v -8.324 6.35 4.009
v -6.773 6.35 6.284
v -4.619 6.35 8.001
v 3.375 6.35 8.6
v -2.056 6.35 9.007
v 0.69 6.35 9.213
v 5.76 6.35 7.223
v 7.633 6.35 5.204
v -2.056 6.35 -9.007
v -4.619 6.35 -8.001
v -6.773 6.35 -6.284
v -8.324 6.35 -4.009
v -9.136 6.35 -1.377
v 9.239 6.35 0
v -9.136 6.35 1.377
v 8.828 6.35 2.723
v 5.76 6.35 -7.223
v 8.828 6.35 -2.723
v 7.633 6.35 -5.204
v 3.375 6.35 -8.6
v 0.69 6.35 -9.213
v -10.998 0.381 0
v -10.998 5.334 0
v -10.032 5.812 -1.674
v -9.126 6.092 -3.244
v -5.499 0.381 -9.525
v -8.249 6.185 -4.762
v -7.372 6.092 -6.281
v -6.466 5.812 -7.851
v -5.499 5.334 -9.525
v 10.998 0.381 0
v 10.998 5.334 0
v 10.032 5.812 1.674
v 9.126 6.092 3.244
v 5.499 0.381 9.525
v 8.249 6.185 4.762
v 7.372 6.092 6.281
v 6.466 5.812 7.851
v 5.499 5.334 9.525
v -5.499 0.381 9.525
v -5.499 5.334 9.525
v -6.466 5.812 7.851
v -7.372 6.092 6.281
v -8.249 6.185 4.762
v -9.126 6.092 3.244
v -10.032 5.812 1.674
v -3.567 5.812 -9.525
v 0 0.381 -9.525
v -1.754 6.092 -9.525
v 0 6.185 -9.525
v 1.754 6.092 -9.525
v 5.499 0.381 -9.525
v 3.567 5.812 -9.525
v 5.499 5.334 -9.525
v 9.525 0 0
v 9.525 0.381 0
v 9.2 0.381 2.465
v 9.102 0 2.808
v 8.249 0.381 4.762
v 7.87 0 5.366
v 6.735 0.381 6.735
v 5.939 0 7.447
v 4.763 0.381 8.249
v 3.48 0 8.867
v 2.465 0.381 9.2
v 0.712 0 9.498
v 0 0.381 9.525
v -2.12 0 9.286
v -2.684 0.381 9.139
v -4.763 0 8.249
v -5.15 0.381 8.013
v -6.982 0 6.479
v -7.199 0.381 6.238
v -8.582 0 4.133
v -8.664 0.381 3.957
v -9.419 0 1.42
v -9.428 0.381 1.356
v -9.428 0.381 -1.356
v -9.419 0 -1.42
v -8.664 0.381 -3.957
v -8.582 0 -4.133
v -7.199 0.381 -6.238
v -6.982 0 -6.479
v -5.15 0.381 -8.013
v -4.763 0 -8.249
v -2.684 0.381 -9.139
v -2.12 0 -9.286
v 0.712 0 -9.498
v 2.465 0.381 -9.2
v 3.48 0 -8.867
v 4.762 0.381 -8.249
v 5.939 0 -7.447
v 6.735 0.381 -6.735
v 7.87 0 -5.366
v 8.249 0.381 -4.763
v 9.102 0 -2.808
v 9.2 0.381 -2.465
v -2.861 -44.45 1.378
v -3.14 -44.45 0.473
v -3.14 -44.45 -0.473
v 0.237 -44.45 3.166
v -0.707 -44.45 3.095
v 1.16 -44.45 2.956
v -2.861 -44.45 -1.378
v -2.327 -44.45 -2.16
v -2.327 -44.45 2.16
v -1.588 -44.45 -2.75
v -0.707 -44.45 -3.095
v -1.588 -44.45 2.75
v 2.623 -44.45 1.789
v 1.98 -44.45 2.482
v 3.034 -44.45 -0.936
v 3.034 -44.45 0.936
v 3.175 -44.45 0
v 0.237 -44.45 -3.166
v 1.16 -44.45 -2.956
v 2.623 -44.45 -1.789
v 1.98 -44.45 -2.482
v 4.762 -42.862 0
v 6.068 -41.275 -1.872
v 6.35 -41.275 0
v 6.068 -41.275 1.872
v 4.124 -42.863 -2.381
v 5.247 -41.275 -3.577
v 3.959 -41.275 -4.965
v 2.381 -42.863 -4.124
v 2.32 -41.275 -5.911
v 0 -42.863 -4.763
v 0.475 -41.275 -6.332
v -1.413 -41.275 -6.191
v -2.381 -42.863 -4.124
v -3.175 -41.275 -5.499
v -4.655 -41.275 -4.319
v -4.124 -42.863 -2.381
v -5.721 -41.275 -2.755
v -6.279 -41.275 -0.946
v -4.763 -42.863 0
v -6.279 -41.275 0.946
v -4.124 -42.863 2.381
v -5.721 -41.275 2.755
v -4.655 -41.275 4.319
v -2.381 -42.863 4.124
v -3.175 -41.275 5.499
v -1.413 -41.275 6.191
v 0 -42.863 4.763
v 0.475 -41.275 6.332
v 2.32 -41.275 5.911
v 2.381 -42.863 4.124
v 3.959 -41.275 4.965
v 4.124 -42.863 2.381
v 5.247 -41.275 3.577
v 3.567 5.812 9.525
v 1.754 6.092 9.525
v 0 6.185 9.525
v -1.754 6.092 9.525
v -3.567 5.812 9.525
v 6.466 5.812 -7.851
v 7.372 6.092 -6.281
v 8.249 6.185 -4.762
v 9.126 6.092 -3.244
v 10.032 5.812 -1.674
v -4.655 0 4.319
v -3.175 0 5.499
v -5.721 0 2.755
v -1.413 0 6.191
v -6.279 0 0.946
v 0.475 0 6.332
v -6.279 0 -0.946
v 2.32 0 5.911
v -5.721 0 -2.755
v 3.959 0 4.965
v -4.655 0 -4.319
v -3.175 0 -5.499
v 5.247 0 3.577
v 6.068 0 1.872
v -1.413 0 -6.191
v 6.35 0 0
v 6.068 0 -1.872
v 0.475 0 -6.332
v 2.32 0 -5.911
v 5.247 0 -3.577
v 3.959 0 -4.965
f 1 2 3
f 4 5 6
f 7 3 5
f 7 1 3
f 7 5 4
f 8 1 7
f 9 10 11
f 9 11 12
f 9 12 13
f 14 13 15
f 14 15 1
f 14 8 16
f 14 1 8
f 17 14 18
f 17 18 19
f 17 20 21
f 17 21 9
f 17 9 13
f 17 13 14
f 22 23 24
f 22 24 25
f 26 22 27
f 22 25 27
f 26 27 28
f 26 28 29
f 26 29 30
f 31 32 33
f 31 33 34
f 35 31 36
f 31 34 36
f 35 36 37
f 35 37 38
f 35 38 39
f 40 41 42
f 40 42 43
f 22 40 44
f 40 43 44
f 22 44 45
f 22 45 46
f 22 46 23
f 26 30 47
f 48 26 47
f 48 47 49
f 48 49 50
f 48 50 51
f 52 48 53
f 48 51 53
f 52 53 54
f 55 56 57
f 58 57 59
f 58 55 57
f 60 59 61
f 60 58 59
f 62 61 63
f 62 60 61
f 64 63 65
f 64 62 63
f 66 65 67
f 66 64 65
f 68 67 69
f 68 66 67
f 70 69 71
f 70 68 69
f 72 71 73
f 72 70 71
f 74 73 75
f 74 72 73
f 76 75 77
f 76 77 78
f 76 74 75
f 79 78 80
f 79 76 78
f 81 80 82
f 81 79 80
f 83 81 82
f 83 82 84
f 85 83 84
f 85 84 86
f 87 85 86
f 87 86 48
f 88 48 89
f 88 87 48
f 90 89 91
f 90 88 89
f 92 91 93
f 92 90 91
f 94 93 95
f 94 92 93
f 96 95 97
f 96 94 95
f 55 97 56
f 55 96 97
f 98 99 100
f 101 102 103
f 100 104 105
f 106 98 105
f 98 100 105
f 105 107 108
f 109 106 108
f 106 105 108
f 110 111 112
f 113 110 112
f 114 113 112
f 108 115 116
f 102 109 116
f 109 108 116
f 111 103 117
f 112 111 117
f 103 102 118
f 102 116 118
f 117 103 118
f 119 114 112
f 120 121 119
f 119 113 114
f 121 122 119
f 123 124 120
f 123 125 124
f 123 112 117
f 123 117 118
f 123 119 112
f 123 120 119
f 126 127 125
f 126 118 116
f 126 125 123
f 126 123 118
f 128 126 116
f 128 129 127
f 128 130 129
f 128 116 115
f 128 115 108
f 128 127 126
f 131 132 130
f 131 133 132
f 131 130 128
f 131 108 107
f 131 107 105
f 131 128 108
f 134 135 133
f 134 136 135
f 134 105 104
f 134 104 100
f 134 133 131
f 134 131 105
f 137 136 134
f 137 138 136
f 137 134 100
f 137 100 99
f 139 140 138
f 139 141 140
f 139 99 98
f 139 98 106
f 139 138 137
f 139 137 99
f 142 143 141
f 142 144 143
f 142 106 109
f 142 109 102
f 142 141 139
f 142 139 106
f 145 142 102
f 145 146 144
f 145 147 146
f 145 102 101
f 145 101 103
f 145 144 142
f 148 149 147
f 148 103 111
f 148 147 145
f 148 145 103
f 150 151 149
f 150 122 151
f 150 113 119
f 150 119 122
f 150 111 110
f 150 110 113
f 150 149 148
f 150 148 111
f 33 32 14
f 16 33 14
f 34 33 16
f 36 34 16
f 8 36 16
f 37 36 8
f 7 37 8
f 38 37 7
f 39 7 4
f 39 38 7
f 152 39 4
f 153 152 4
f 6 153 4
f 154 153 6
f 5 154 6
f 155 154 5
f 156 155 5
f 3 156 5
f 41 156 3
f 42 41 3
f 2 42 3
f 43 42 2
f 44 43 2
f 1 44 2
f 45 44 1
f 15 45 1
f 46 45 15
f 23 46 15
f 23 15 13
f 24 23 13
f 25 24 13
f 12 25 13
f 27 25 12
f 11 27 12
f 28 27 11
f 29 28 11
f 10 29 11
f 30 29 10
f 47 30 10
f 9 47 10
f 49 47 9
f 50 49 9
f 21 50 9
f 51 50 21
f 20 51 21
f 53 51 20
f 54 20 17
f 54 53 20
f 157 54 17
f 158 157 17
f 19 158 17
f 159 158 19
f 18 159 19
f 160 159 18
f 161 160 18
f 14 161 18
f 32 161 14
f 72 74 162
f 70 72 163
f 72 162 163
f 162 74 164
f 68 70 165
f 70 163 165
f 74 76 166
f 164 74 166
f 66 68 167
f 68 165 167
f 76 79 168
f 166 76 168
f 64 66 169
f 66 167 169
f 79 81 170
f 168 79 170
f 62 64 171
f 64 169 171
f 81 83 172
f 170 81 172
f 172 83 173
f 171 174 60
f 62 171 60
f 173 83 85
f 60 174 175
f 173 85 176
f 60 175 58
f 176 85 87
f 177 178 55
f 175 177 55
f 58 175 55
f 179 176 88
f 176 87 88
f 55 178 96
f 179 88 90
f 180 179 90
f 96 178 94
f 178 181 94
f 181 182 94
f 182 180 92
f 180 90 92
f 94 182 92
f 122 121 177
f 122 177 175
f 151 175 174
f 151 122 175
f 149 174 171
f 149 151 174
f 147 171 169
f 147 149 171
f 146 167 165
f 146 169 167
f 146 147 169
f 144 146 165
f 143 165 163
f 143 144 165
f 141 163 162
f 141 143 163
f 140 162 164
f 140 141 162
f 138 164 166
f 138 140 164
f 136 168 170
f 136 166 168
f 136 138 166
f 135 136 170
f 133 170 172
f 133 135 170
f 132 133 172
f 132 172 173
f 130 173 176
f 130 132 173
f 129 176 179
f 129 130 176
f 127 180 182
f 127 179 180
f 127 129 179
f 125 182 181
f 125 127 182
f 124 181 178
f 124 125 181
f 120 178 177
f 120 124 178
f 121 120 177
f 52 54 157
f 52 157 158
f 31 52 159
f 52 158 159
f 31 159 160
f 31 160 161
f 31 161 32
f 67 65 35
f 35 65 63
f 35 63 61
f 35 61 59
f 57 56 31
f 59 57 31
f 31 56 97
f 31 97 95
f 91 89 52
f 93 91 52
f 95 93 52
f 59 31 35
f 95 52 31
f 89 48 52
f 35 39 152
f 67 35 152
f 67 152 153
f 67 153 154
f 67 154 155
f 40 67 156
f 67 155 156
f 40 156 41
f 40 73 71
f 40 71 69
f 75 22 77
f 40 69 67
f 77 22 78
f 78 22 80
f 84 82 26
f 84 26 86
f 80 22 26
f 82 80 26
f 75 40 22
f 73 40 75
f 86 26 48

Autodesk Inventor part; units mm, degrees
ref_plane "YZ Plane" through (0, 0, 0) normal (1, 0, 0) x (0, 1, 0)
ref_plane "XZ Plane" through (0, 0, 0) normal (0, 1, 0) x (-1, 0, 0)
ref_plane "XY Plane" through (0, 0, 0) normal (0, 0, 1) x (1, 0, 0)
sketch "Sketch1" plane through (0, 0, 0) normal (0, 0, 1) x (1, 0, 0)
  line L0 (0, 0) -> (6.35, 0)
  line L1 (6.35, 0) -> (6.35, -44.45)
  line L2 (6.35, -44.45) -> (0, -44.45)
  line L3 (0, -44.45) -> (0, 0)
  dimension "d0" = 12.7
  dimension "d1" = 44.45
revolve "Revolution1" add sketch "Sketch1" angle 360 about axis through (0, -44.45, 0) along (0, 1, 0)
chamfer "Chamfer1" distance 3.175 angle 45 1 edges at (-6.35, -44.45, 0)
sketch "Sketch2" plane through (0, 0, 0) normal (0, 1, 0) x (1, 0, 0)
  circle A0 centre (0, 0) radius 9.525
  point P0 (0, 0)
  dimension "d6" = 19.05
extrude "Extrusion1" add sketch "Sketch2" along normal blind 6.35
sketch "Sketch3" plane through (0, 6.35, 0) normal (0, 1, 0) x (1, 0, 0)
  line L0 (10.9985, 0) -> (5.4993, -9.525)
  line L1 (5.4993, -9.525) -> (-5.4993, -9.525)
  line L2 (-5.4993, -9.525) -> (-10.9985, 0)
  line L3 (-10.9985, 0) -> (-5.4993, 9.525)
  line L4 (-5.4993, 9.525) -> (5.4993, 9.525)
  line L5 (5.4993, 9.525) -> (10.9985, 0)
  circle A0 centre (0, 0) radius 9.525 construction
  point P0 (0, 0)
  point P1 (0, 0)
extrude "Extrusion2" add sketch "Sketch3" against normal blind 5.969
sketch "Sketch4" plane through (0, 0, 0) normal (0, 0, 1) x (1, 0, 0)
  line L0 (9.2388, 6.35) -> (10.9985, 6.35)
  line L1 (10.9985, 6.35) -> (10.9985, 5.334)
  line L2 (10.9985, 5.334) -> (9.2388, 6.35)
  line L3 (0, -1.5875) -> (0, 9.525) projected
  line L4 (5.4993, 0) -> (10.9985, 0) construction
  line L5 (5.4993, 6.35) -> (10.9985, 6.35) construction
  line L6 (5.4993, 6.35) -> (5.4993, 0.381) construction
  line L7 (10.9985, 6.35) -> (10.9985, 0.381) construction
  line L8 (10.9985, 6.35) -> (5.4993, 6.35) projected
  line L9 (8.2489, 0.381) -> (10.9985, 0.381) projected
  line L10 (5.4993, 0.381) -> (8.2489, 0.381) projected
  point P0 (0, 0)
  point P1 (16.2522, 7.9375)
  dimension "d11" = 30
  dimension "d17" = 1.016
revolve "Revolution2" cut sketch "Sketch4" angle 360 about axis through (0, -10, 0) along (0, 1, 0)
thread "Thread3" size "1/2-13 UNC" class "2A" standard "ANSI Unified Screw Threads" full length
equation "\"diameter\" = 1.8542"
equation "\"length\" = 19.05"
properties part number "Door Hinge Pin" material "Steel, Carbon"
